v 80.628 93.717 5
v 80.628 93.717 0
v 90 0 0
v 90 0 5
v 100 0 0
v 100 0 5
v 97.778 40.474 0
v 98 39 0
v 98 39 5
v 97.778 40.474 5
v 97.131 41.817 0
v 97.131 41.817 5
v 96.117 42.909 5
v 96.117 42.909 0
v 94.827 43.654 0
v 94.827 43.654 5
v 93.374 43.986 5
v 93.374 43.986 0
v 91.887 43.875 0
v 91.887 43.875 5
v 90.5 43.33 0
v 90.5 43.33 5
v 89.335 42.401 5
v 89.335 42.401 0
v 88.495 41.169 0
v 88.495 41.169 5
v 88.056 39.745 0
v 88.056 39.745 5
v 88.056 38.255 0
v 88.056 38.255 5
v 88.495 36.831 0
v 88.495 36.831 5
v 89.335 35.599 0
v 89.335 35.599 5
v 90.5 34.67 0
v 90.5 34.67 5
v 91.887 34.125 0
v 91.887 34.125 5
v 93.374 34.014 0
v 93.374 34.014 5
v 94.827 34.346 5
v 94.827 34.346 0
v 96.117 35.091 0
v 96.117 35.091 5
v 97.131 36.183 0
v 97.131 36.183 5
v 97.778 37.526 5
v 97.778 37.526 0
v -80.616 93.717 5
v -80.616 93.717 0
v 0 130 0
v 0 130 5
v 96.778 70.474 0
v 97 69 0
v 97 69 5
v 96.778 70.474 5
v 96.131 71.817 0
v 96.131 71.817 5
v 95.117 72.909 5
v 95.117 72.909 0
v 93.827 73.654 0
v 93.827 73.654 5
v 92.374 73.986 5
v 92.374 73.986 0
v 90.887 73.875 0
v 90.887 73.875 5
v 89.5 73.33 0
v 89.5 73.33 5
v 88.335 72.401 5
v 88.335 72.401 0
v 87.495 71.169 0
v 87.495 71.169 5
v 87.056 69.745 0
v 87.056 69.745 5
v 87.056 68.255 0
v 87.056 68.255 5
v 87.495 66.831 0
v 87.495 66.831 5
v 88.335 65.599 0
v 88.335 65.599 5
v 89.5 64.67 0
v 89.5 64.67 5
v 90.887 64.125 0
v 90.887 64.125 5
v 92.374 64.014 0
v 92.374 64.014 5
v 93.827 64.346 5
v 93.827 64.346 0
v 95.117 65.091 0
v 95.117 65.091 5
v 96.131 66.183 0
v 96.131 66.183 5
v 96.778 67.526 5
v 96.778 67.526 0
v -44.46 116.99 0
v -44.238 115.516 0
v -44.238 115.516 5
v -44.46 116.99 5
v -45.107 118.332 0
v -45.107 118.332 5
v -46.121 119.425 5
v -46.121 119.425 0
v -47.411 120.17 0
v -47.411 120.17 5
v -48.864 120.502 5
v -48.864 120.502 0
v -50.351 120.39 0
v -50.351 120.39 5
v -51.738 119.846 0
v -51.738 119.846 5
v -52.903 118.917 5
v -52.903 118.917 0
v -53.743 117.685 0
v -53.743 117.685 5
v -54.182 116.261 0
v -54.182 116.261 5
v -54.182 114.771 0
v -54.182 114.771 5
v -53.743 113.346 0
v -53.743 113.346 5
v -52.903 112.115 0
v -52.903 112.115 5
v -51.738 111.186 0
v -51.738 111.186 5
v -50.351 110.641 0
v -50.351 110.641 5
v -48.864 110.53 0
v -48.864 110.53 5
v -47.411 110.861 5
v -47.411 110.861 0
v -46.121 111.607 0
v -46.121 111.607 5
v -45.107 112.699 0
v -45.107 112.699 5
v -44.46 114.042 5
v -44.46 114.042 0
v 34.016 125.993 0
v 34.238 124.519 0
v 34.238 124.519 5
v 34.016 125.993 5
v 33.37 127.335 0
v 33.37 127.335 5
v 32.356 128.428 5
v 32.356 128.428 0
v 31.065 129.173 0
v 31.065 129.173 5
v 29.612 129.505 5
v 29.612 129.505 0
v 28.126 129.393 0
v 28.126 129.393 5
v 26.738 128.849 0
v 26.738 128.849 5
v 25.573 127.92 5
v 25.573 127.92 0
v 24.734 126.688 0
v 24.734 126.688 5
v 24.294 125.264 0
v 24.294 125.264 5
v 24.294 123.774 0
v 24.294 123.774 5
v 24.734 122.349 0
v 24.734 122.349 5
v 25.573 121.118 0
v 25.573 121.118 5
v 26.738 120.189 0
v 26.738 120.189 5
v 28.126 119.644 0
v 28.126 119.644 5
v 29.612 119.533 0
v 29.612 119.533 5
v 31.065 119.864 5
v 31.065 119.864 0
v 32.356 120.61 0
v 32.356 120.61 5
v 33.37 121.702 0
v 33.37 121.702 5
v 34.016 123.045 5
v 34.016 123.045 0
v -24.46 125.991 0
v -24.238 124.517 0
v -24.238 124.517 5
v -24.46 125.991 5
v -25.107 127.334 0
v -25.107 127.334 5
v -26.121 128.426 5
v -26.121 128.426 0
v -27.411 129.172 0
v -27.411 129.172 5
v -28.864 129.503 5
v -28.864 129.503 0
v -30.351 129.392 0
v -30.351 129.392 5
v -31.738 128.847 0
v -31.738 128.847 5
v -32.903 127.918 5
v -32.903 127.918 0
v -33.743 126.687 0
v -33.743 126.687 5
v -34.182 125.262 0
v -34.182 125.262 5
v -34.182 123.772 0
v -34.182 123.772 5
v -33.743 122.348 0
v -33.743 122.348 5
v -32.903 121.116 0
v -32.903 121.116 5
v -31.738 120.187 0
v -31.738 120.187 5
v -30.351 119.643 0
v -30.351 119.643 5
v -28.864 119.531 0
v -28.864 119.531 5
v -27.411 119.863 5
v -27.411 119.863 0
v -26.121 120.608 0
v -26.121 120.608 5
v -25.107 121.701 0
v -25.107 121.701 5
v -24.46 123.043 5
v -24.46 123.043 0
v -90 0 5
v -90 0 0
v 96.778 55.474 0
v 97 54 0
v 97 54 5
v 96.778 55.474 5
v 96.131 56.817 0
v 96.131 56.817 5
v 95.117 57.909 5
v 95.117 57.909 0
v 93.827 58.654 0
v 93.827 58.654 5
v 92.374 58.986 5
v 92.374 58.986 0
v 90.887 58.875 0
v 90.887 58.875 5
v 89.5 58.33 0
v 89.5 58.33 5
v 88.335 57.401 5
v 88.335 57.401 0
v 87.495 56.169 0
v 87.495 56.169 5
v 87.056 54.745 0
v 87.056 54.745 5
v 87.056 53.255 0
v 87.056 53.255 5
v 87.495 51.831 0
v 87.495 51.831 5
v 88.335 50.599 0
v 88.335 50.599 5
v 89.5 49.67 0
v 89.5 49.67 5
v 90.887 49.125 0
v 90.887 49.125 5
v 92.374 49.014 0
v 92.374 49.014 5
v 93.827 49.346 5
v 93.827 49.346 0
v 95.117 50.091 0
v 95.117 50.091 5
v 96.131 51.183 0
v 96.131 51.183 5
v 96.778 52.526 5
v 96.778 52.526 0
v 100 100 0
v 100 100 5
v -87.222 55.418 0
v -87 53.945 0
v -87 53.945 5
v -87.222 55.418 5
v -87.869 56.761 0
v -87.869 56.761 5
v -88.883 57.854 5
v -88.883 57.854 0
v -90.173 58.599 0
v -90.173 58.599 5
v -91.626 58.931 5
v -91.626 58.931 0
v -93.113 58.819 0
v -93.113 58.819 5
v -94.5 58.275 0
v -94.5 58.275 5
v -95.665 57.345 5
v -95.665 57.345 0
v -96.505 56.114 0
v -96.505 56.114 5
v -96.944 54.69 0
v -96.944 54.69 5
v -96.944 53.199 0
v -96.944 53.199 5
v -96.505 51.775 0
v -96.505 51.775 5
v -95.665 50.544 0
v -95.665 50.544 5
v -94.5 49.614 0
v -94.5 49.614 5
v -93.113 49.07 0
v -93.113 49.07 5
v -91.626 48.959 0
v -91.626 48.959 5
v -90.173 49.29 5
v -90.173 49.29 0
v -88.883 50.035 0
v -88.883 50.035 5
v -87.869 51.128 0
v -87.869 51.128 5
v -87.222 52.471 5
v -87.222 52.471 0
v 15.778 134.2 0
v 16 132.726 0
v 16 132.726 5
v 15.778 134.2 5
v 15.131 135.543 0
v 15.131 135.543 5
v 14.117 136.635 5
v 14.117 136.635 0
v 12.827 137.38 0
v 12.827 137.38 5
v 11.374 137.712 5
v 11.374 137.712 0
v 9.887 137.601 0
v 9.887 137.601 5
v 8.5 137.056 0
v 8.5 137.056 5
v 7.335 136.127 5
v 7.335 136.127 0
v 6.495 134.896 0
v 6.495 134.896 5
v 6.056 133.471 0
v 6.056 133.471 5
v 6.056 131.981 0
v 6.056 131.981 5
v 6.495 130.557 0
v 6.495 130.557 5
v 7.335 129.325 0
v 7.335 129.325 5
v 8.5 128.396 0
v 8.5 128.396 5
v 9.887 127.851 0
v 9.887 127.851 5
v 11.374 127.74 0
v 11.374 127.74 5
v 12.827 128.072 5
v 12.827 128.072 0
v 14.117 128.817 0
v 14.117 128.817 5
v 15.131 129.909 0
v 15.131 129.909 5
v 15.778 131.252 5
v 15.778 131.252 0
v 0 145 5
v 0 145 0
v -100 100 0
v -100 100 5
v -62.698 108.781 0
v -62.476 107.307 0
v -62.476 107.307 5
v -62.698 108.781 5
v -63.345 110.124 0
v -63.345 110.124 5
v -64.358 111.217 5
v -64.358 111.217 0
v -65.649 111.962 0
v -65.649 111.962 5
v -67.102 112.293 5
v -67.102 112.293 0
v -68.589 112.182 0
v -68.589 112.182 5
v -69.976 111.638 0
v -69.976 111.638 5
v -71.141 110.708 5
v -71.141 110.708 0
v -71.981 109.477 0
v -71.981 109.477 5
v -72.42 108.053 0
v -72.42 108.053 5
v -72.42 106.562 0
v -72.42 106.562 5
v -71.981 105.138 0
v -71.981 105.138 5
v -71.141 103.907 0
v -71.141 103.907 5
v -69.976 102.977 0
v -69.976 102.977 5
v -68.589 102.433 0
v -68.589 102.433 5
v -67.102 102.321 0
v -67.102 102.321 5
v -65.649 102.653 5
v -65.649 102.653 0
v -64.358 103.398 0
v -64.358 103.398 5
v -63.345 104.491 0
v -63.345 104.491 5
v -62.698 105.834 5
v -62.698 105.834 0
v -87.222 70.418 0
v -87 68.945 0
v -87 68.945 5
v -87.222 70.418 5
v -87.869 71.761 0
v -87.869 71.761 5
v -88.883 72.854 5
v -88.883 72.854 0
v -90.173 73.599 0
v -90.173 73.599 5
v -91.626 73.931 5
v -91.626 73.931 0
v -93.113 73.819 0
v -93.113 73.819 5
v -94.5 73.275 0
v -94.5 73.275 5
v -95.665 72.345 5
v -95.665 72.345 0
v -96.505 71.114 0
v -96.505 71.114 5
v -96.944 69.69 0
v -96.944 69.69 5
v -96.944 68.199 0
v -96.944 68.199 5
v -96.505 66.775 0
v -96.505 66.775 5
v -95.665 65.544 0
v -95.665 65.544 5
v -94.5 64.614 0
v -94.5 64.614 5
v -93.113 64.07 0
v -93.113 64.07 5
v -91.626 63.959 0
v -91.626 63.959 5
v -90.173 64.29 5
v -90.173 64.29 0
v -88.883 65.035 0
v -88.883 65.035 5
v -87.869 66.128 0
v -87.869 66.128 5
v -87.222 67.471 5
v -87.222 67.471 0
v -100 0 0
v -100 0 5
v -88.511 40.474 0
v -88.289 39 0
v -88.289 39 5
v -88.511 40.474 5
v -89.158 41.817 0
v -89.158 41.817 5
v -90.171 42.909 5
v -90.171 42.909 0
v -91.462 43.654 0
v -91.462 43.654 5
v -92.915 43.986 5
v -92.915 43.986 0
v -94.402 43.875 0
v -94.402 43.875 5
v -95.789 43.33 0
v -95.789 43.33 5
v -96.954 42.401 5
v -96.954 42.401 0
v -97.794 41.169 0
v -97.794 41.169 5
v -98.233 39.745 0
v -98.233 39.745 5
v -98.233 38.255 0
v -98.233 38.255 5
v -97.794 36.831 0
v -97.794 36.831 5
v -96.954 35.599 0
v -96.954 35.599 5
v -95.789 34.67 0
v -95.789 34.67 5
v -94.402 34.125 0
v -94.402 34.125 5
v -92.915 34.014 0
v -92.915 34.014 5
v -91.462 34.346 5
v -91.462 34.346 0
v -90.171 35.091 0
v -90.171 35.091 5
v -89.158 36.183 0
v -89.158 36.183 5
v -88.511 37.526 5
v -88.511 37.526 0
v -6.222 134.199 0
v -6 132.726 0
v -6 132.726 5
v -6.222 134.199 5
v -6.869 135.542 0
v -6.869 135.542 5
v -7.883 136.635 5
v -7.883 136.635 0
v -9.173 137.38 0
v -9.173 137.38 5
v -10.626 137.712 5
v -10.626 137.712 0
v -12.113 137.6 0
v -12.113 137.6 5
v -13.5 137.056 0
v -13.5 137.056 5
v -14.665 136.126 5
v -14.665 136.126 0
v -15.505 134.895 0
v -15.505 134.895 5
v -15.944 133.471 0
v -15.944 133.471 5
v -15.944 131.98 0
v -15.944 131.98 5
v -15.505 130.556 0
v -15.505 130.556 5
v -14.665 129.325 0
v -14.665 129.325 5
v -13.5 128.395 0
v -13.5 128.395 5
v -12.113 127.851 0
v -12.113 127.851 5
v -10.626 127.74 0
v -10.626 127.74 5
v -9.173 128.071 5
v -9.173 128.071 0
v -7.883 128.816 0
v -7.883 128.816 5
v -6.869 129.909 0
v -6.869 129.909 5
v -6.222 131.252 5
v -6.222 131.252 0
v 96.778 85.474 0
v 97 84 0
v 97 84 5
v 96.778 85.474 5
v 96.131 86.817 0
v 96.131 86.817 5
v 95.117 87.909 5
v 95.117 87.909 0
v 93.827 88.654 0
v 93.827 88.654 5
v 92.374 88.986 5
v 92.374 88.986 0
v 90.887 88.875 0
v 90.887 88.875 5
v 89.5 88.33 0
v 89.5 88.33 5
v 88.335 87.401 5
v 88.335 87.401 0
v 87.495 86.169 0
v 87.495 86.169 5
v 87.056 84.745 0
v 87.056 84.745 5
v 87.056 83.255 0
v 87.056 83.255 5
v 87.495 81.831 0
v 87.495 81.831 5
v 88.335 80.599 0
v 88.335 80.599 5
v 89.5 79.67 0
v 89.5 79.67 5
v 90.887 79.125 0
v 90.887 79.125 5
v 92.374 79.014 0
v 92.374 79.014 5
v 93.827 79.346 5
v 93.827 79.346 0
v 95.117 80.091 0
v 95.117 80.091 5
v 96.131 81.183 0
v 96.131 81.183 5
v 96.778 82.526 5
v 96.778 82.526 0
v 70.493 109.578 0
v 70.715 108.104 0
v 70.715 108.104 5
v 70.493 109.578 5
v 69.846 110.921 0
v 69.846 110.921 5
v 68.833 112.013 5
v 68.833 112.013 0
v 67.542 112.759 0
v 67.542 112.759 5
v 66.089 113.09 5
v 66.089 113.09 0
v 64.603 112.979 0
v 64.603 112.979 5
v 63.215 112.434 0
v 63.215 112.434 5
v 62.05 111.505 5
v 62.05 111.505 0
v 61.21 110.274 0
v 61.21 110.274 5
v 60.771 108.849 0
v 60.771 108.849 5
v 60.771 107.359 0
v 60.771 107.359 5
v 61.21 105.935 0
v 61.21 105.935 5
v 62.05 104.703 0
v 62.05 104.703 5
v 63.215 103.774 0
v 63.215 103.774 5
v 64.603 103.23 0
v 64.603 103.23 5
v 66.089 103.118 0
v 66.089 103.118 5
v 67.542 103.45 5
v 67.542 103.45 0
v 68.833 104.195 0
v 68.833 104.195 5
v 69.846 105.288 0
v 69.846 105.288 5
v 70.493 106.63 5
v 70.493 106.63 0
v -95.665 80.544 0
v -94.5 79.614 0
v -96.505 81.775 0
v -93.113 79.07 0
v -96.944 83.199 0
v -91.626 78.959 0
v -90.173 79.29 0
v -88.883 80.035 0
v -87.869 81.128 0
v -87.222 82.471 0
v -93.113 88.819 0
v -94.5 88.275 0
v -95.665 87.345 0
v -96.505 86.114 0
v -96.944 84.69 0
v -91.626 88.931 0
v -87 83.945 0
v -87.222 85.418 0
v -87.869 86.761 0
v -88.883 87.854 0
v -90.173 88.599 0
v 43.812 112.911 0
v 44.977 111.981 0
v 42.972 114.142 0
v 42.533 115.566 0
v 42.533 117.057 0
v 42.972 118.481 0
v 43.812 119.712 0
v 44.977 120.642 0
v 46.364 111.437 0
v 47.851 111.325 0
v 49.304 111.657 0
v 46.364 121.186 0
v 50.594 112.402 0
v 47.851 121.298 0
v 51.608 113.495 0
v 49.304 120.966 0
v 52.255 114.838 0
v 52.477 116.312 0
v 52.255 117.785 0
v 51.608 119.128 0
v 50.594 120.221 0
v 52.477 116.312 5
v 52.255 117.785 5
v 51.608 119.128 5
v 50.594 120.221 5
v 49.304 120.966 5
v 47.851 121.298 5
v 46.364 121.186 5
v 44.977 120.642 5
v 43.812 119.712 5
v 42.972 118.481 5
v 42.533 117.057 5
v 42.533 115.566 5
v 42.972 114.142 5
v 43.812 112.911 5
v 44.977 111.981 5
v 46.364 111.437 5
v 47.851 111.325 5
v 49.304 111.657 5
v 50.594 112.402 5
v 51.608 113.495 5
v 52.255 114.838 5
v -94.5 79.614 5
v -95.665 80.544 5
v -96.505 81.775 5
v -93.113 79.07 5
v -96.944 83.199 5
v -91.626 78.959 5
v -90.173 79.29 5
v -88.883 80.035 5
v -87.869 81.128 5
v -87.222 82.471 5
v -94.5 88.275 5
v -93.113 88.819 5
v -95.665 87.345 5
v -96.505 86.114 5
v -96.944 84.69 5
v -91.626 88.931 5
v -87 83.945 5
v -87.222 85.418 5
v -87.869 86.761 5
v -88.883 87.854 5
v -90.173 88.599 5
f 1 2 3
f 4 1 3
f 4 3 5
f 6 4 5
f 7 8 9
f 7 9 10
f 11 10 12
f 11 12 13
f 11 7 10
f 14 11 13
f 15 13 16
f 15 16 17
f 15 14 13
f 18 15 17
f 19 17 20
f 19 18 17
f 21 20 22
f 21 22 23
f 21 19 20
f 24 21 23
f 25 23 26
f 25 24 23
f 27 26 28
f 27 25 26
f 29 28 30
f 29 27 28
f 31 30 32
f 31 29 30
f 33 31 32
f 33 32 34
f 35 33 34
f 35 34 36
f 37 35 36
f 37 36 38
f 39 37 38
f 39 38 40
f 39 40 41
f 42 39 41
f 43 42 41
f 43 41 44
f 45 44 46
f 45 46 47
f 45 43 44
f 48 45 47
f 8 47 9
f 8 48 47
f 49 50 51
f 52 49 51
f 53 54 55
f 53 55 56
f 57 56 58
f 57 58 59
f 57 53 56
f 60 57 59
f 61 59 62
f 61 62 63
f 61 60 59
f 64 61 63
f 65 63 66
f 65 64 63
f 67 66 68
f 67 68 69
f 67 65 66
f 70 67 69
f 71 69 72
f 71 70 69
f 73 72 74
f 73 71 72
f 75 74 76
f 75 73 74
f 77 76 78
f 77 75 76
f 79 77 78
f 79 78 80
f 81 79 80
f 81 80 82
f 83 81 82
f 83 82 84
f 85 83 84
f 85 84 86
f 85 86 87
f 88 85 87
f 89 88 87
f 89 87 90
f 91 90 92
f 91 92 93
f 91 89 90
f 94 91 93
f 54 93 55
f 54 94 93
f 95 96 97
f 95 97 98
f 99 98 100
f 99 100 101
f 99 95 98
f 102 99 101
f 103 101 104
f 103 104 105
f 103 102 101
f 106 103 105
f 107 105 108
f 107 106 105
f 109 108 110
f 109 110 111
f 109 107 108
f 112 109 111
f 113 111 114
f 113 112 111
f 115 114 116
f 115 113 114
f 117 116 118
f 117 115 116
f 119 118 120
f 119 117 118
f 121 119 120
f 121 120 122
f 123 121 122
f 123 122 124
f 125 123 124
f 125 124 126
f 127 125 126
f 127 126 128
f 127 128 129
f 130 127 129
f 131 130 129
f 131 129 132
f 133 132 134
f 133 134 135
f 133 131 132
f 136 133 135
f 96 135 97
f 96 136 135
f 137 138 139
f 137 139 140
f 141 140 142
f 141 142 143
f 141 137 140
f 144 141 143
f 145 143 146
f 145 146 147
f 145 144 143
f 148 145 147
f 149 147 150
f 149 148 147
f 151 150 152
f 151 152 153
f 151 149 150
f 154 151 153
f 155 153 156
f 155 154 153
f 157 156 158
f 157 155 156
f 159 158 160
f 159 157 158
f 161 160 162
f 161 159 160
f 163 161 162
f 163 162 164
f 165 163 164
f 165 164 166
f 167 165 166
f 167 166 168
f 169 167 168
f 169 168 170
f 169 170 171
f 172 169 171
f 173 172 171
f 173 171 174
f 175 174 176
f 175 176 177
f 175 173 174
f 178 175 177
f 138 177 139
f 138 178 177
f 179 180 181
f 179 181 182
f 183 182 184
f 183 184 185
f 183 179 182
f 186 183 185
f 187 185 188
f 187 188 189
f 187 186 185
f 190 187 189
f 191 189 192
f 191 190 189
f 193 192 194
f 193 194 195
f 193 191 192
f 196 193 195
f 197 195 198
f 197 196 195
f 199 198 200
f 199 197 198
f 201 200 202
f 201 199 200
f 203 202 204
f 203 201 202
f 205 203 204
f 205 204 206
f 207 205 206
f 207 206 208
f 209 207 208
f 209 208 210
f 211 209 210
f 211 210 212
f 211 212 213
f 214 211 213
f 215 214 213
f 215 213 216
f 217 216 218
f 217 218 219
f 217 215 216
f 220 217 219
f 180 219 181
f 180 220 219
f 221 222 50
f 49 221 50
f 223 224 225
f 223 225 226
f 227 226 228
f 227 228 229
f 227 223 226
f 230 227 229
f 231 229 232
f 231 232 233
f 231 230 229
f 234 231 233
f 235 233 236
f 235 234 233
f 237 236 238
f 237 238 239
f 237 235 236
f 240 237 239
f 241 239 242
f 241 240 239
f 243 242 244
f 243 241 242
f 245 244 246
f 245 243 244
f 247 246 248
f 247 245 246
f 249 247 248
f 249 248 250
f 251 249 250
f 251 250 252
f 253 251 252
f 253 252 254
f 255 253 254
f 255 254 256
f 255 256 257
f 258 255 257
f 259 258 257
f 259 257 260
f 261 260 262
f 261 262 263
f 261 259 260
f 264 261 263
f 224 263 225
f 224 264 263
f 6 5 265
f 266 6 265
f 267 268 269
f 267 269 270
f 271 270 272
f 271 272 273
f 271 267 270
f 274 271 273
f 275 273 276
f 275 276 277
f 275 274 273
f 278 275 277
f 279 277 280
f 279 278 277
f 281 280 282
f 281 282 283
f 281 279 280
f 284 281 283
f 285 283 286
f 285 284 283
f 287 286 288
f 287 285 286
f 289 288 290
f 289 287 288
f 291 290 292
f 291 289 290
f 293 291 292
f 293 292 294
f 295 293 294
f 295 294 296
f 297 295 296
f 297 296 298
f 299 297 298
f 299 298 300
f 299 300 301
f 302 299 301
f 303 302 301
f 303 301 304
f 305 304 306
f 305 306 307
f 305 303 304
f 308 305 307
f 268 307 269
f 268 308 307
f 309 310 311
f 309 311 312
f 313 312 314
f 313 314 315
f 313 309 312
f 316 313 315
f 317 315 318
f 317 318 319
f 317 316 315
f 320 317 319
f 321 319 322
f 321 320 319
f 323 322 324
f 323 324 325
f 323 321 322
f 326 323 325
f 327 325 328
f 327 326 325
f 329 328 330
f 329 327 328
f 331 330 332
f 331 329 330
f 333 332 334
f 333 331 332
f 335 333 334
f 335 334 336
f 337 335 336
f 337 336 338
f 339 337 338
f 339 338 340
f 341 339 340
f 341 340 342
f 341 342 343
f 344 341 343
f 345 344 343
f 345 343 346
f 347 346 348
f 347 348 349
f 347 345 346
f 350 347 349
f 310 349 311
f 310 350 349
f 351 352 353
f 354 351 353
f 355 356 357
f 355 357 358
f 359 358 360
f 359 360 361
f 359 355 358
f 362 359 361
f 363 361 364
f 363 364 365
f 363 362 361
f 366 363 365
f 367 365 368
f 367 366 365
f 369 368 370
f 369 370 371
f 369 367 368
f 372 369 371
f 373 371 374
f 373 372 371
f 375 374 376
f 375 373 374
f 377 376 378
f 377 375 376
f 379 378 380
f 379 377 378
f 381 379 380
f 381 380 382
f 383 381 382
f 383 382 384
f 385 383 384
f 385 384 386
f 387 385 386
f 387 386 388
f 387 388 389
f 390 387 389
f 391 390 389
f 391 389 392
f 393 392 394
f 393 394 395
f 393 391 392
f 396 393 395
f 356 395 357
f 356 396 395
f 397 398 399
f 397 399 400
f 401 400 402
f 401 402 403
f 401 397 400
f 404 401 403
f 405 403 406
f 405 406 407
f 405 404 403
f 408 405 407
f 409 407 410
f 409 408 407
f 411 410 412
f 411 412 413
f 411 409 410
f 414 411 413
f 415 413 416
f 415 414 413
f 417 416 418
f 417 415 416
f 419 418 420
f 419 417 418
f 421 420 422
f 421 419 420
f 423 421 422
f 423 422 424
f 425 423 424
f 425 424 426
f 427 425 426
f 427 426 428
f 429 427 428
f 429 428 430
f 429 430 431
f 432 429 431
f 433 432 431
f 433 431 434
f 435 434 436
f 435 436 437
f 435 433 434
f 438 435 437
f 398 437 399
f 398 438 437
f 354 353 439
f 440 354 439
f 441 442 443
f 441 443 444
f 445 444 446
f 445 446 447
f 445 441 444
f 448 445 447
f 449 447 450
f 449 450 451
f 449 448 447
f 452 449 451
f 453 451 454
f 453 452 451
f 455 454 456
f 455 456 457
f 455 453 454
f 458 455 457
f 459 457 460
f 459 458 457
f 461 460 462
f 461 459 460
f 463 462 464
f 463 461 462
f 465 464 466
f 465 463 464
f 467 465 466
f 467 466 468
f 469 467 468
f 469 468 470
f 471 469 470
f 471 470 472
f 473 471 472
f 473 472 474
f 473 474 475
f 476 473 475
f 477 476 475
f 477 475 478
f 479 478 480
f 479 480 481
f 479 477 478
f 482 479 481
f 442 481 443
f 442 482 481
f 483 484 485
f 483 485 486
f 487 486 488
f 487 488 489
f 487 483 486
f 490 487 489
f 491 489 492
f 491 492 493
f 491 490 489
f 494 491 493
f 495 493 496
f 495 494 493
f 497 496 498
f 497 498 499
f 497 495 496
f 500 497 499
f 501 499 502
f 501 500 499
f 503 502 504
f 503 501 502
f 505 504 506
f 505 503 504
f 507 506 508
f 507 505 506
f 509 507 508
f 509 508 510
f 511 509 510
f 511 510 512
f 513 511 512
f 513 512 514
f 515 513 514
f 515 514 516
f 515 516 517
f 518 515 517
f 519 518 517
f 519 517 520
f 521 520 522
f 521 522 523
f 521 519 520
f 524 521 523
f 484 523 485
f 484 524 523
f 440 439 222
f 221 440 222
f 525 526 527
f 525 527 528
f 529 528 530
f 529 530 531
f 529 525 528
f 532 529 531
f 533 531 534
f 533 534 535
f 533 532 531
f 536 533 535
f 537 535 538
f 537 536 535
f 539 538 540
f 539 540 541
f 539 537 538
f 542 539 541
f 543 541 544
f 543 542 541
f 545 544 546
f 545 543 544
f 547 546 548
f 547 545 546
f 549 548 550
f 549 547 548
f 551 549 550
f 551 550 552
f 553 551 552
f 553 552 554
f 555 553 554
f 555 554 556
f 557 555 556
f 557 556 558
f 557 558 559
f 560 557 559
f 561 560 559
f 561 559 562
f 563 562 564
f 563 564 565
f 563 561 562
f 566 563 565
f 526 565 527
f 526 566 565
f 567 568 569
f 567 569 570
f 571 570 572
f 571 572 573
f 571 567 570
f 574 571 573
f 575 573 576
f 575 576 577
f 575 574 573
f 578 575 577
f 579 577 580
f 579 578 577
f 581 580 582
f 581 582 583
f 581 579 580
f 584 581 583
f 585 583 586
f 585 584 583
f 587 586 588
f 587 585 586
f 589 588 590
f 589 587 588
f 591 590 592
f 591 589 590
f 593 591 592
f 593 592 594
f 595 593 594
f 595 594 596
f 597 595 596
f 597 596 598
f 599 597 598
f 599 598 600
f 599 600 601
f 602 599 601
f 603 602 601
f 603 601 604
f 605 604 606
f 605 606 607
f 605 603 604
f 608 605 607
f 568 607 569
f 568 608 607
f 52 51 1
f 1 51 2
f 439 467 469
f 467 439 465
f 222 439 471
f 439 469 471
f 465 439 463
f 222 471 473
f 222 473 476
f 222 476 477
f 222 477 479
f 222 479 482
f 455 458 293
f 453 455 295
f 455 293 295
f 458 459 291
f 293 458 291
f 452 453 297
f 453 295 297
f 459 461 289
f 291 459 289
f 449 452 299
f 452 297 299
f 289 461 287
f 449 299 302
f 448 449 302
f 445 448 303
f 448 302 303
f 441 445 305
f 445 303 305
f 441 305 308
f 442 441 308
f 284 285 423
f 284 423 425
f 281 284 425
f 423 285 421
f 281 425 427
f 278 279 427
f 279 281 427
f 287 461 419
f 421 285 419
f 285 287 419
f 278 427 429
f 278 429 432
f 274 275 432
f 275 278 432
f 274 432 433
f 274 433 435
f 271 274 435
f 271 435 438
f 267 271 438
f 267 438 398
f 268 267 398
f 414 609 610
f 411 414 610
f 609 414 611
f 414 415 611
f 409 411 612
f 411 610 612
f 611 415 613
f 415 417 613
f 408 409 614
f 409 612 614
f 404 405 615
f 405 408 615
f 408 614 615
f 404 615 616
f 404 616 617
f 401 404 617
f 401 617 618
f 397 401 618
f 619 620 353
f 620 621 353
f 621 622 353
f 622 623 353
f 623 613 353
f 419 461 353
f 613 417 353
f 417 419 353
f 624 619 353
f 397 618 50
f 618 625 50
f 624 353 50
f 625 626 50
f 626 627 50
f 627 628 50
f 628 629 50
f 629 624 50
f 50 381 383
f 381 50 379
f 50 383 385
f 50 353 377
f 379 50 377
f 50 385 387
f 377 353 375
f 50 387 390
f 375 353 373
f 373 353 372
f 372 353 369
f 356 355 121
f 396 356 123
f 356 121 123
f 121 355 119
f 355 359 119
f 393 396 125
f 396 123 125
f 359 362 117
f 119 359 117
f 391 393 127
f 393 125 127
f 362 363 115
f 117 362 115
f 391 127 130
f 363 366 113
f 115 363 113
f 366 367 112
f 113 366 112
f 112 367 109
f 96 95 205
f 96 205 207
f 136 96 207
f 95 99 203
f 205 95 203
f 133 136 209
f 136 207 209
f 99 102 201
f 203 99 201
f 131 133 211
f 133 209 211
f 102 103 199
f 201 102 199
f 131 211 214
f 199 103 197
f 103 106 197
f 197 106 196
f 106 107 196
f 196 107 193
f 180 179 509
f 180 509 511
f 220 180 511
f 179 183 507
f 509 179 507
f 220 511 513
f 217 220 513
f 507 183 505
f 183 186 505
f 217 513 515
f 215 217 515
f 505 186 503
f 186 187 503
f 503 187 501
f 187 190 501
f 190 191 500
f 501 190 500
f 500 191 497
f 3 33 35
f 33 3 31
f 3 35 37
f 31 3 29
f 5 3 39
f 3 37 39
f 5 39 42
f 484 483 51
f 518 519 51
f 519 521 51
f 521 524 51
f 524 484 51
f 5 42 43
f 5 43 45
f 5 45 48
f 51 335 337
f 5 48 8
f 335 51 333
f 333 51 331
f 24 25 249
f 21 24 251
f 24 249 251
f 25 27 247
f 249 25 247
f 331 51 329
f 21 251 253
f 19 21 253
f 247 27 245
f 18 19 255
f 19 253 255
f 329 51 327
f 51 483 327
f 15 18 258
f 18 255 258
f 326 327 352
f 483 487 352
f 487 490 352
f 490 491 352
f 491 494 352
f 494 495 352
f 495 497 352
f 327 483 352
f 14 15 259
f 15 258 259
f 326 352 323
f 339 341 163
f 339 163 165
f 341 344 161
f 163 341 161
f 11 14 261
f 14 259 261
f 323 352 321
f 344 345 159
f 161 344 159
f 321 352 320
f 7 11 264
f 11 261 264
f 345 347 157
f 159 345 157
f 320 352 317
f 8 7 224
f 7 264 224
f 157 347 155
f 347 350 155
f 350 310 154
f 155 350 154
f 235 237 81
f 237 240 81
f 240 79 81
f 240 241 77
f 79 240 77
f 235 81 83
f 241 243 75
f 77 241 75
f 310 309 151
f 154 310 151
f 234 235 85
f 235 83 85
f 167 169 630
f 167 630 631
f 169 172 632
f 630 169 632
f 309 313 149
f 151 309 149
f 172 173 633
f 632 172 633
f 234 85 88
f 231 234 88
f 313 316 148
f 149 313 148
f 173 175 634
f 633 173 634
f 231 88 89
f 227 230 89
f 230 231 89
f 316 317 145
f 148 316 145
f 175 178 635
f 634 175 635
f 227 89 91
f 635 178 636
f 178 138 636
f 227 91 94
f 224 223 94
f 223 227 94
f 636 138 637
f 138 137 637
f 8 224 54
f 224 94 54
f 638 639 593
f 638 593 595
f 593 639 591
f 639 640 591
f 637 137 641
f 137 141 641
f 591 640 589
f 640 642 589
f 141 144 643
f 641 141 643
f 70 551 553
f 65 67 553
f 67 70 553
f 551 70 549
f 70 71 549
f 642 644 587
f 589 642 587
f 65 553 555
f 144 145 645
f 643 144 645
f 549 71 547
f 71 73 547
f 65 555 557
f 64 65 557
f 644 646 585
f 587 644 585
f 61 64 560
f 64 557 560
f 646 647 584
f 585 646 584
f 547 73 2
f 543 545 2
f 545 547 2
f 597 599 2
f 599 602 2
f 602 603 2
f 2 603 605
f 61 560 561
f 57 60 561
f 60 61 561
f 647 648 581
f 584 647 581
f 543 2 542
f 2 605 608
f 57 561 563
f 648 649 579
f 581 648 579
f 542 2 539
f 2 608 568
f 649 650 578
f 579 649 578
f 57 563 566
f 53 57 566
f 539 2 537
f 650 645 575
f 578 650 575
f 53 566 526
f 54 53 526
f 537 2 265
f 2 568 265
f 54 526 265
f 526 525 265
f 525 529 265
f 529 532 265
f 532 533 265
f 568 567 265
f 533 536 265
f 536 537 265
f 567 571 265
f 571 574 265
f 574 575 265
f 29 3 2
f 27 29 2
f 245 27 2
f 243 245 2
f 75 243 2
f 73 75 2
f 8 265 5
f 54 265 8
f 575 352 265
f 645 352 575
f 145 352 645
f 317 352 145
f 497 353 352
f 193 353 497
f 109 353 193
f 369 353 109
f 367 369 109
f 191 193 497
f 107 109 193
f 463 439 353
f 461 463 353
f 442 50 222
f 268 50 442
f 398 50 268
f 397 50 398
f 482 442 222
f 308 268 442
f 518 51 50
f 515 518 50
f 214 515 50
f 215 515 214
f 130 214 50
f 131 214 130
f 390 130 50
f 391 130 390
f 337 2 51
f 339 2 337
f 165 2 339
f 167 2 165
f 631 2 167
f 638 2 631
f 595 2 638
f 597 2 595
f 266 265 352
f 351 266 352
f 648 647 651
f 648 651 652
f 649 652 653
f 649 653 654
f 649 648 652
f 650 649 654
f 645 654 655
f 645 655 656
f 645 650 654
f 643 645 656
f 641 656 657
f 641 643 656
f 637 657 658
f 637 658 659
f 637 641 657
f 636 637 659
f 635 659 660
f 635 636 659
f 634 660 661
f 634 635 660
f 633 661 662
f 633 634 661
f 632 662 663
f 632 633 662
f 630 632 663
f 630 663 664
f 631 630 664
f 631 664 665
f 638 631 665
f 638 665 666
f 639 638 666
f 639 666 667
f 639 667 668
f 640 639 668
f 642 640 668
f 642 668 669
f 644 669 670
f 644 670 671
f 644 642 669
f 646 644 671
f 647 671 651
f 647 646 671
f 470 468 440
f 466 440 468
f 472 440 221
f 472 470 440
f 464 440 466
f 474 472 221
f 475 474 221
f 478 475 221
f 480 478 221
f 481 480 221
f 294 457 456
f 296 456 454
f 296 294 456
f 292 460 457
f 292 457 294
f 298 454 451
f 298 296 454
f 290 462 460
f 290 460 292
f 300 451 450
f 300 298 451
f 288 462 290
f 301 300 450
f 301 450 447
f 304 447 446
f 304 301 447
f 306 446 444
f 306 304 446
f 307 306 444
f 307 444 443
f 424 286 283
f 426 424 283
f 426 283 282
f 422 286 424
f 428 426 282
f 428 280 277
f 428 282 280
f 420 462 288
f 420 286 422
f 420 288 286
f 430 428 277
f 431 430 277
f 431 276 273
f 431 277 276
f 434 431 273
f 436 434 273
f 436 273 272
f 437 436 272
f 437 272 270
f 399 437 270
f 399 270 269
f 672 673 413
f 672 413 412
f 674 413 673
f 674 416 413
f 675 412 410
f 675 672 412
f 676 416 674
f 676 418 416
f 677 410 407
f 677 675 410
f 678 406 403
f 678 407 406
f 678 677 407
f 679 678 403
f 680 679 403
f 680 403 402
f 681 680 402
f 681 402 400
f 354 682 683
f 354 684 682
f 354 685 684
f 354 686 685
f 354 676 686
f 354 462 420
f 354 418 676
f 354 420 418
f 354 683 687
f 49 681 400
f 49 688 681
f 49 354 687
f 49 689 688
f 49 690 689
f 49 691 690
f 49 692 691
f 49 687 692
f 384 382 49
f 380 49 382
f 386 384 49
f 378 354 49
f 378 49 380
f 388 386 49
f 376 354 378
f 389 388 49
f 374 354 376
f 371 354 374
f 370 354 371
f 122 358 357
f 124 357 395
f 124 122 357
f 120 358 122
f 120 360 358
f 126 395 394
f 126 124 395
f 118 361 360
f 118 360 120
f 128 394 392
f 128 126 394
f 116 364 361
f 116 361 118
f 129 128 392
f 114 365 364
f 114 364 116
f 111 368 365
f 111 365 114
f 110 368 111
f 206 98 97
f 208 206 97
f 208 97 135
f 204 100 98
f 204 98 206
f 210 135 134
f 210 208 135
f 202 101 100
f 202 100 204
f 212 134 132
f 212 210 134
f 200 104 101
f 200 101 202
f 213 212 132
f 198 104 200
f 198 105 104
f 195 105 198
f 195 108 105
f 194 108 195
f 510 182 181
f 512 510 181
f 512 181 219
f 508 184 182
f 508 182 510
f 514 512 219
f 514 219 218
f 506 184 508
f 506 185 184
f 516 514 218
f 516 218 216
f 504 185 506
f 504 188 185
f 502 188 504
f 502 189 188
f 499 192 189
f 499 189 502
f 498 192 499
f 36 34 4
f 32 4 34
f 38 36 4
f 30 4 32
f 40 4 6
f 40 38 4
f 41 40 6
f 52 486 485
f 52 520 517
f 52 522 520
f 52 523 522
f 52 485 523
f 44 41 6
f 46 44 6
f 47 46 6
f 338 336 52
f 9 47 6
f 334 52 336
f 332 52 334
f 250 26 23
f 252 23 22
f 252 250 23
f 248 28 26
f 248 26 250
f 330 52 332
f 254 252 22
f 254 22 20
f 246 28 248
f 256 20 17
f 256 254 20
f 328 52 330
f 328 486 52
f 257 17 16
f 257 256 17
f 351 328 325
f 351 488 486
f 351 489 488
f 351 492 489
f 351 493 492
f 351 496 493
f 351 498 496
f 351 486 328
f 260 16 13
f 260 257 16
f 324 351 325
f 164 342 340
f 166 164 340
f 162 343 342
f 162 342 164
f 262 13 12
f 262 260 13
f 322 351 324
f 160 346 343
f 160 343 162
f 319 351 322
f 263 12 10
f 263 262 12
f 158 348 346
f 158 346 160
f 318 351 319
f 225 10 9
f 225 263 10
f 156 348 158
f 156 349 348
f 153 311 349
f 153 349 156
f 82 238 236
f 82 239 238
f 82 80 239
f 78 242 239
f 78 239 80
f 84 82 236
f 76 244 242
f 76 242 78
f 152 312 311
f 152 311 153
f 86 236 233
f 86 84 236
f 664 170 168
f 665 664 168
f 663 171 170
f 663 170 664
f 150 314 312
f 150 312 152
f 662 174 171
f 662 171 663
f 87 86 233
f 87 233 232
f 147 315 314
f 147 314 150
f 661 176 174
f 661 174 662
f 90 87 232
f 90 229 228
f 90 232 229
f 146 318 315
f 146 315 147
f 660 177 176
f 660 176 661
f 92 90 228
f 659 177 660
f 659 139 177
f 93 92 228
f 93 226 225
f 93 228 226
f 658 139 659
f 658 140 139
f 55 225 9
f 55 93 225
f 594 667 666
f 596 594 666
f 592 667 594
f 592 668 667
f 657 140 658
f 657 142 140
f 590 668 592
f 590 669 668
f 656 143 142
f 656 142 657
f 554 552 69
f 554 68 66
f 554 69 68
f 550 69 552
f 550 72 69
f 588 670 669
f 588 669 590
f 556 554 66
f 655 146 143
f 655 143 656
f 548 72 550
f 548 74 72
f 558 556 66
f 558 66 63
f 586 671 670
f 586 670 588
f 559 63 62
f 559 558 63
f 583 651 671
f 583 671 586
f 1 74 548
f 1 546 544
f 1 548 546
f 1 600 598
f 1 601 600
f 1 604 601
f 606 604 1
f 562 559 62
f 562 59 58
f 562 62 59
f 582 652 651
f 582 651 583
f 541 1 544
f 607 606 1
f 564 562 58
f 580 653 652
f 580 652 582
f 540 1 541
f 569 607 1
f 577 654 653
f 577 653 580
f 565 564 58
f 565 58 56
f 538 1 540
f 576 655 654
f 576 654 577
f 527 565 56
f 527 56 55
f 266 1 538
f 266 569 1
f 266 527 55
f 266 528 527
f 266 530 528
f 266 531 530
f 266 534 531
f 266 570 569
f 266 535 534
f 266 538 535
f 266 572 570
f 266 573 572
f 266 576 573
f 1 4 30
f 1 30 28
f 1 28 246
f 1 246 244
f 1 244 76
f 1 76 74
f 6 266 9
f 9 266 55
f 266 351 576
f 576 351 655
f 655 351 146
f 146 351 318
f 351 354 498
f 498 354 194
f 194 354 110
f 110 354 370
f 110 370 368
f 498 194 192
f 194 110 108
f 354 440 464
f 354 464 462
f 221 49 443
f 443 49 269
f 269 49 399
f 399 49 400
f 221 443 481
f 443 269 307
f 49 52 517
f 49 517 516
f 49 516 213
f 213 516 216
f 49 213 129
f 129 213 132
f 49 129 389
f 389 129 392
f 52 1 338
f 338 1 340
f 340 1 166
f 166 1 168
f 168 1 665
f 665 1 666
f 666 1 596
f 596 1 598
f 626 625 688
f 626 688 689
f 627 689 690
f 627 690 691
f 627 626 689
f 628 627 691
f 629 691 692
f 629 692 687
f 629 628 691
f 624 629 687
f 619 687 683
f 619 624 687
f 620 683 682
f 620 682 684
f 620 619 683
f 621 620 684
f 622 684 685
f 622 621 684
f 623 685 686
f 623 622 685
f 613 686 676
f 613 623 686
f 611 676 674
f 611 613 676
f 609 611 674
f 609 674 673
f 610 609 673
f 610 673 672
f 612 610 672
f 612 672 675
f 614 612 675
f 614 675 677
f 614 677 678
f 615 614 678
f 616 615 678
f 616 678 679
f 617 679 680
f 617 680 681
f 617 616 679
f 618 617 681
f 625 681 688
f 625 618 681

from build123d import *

# Parameters (mm, degrees)
F0_R     = 5
F1_DEPTH = 5


with BuildPart() as f1:
    # F0 (on Top) → F1 (new body)
    with BuildSketch(Plane.XY):
        Polygon((80.628272, 93.717277), (90, 0), (100, 0), (100, 100), (80, 100), align=None)
        with Locations((93, 39)):
            Circle(F0_R, mode=Mode.SUBTRACT)
        with Locations((92, 54)):
            Circle(F0_R, mode=Mode.SUBTRACT)
        with Locations((92, 69)):
            Circle(F0_R, mode=Mode.SUBTRACT)
        with Locations((92, 84)):
            Circle(F0_R, mode=Mode.SUBTRACT)
        Polygon((-100, 0), (-90, 0), (-80.61579, 93.717277), (-80.000474, 99.86225), (-100, 100), align=None)
        with Locations((-93.288932, 39)):
            Circle(F0_R, mode=Mode.SUBTRACT)
        with Locations((-92, 53.944519)):
            Circle(F0_R, mode=Mode.SUBTRACT)
        with Locations((-92, 68.944519)):
            Circle(F0_R, mode=Mode.SUBTRACT)
        with Locations((-92, 83.944519)):
            Circle(F0_R, mode=Mode.SUBTRACT)
        Polygon((0, 145), (0, 130), (80.628272, 93.717277), (80, 100), (100, 100), align=None)
        with Locations((65.71529, 108.104219)):
            Circle(F0_R, mode=Mode.SUBTRACT)
        with Locations((47.47686, 116.311512)):
            Circle(F0_R, mode=Mode.SUBTRACT)
        with Locations((29.23843, 124.518806)):
            Circle(F0_R, mode=Mode.SUBTRACT)
        with Locations((11, 132.726099)):
            Circle(F0_R, mode=Mode.SUBTRACT)
        Polygon((-80.61579, 93.717277), (0, 130), (0, 145), (-100, 100), (-80.000474, 99.86225), align=None)
        with Locations((-67.475909, 107.307439)):
            Circle(F0_R, mode=Mode.SUBTRACT)
        with Locations((-49.237955, 115.515789)):
            Circle(F0_R, mode=Mode.SUBTRACT)
        with Locations((-29.237955, 124.517183)):
            Circle(F0_R, mode=Mode.SUBTRACT)
        with Locations((-11, 132.725533)):
            Circle(F0_R, mode=Mode.SUBTRACT)
    extrude(amount=F1_DEPTH)


solid = f1.part
